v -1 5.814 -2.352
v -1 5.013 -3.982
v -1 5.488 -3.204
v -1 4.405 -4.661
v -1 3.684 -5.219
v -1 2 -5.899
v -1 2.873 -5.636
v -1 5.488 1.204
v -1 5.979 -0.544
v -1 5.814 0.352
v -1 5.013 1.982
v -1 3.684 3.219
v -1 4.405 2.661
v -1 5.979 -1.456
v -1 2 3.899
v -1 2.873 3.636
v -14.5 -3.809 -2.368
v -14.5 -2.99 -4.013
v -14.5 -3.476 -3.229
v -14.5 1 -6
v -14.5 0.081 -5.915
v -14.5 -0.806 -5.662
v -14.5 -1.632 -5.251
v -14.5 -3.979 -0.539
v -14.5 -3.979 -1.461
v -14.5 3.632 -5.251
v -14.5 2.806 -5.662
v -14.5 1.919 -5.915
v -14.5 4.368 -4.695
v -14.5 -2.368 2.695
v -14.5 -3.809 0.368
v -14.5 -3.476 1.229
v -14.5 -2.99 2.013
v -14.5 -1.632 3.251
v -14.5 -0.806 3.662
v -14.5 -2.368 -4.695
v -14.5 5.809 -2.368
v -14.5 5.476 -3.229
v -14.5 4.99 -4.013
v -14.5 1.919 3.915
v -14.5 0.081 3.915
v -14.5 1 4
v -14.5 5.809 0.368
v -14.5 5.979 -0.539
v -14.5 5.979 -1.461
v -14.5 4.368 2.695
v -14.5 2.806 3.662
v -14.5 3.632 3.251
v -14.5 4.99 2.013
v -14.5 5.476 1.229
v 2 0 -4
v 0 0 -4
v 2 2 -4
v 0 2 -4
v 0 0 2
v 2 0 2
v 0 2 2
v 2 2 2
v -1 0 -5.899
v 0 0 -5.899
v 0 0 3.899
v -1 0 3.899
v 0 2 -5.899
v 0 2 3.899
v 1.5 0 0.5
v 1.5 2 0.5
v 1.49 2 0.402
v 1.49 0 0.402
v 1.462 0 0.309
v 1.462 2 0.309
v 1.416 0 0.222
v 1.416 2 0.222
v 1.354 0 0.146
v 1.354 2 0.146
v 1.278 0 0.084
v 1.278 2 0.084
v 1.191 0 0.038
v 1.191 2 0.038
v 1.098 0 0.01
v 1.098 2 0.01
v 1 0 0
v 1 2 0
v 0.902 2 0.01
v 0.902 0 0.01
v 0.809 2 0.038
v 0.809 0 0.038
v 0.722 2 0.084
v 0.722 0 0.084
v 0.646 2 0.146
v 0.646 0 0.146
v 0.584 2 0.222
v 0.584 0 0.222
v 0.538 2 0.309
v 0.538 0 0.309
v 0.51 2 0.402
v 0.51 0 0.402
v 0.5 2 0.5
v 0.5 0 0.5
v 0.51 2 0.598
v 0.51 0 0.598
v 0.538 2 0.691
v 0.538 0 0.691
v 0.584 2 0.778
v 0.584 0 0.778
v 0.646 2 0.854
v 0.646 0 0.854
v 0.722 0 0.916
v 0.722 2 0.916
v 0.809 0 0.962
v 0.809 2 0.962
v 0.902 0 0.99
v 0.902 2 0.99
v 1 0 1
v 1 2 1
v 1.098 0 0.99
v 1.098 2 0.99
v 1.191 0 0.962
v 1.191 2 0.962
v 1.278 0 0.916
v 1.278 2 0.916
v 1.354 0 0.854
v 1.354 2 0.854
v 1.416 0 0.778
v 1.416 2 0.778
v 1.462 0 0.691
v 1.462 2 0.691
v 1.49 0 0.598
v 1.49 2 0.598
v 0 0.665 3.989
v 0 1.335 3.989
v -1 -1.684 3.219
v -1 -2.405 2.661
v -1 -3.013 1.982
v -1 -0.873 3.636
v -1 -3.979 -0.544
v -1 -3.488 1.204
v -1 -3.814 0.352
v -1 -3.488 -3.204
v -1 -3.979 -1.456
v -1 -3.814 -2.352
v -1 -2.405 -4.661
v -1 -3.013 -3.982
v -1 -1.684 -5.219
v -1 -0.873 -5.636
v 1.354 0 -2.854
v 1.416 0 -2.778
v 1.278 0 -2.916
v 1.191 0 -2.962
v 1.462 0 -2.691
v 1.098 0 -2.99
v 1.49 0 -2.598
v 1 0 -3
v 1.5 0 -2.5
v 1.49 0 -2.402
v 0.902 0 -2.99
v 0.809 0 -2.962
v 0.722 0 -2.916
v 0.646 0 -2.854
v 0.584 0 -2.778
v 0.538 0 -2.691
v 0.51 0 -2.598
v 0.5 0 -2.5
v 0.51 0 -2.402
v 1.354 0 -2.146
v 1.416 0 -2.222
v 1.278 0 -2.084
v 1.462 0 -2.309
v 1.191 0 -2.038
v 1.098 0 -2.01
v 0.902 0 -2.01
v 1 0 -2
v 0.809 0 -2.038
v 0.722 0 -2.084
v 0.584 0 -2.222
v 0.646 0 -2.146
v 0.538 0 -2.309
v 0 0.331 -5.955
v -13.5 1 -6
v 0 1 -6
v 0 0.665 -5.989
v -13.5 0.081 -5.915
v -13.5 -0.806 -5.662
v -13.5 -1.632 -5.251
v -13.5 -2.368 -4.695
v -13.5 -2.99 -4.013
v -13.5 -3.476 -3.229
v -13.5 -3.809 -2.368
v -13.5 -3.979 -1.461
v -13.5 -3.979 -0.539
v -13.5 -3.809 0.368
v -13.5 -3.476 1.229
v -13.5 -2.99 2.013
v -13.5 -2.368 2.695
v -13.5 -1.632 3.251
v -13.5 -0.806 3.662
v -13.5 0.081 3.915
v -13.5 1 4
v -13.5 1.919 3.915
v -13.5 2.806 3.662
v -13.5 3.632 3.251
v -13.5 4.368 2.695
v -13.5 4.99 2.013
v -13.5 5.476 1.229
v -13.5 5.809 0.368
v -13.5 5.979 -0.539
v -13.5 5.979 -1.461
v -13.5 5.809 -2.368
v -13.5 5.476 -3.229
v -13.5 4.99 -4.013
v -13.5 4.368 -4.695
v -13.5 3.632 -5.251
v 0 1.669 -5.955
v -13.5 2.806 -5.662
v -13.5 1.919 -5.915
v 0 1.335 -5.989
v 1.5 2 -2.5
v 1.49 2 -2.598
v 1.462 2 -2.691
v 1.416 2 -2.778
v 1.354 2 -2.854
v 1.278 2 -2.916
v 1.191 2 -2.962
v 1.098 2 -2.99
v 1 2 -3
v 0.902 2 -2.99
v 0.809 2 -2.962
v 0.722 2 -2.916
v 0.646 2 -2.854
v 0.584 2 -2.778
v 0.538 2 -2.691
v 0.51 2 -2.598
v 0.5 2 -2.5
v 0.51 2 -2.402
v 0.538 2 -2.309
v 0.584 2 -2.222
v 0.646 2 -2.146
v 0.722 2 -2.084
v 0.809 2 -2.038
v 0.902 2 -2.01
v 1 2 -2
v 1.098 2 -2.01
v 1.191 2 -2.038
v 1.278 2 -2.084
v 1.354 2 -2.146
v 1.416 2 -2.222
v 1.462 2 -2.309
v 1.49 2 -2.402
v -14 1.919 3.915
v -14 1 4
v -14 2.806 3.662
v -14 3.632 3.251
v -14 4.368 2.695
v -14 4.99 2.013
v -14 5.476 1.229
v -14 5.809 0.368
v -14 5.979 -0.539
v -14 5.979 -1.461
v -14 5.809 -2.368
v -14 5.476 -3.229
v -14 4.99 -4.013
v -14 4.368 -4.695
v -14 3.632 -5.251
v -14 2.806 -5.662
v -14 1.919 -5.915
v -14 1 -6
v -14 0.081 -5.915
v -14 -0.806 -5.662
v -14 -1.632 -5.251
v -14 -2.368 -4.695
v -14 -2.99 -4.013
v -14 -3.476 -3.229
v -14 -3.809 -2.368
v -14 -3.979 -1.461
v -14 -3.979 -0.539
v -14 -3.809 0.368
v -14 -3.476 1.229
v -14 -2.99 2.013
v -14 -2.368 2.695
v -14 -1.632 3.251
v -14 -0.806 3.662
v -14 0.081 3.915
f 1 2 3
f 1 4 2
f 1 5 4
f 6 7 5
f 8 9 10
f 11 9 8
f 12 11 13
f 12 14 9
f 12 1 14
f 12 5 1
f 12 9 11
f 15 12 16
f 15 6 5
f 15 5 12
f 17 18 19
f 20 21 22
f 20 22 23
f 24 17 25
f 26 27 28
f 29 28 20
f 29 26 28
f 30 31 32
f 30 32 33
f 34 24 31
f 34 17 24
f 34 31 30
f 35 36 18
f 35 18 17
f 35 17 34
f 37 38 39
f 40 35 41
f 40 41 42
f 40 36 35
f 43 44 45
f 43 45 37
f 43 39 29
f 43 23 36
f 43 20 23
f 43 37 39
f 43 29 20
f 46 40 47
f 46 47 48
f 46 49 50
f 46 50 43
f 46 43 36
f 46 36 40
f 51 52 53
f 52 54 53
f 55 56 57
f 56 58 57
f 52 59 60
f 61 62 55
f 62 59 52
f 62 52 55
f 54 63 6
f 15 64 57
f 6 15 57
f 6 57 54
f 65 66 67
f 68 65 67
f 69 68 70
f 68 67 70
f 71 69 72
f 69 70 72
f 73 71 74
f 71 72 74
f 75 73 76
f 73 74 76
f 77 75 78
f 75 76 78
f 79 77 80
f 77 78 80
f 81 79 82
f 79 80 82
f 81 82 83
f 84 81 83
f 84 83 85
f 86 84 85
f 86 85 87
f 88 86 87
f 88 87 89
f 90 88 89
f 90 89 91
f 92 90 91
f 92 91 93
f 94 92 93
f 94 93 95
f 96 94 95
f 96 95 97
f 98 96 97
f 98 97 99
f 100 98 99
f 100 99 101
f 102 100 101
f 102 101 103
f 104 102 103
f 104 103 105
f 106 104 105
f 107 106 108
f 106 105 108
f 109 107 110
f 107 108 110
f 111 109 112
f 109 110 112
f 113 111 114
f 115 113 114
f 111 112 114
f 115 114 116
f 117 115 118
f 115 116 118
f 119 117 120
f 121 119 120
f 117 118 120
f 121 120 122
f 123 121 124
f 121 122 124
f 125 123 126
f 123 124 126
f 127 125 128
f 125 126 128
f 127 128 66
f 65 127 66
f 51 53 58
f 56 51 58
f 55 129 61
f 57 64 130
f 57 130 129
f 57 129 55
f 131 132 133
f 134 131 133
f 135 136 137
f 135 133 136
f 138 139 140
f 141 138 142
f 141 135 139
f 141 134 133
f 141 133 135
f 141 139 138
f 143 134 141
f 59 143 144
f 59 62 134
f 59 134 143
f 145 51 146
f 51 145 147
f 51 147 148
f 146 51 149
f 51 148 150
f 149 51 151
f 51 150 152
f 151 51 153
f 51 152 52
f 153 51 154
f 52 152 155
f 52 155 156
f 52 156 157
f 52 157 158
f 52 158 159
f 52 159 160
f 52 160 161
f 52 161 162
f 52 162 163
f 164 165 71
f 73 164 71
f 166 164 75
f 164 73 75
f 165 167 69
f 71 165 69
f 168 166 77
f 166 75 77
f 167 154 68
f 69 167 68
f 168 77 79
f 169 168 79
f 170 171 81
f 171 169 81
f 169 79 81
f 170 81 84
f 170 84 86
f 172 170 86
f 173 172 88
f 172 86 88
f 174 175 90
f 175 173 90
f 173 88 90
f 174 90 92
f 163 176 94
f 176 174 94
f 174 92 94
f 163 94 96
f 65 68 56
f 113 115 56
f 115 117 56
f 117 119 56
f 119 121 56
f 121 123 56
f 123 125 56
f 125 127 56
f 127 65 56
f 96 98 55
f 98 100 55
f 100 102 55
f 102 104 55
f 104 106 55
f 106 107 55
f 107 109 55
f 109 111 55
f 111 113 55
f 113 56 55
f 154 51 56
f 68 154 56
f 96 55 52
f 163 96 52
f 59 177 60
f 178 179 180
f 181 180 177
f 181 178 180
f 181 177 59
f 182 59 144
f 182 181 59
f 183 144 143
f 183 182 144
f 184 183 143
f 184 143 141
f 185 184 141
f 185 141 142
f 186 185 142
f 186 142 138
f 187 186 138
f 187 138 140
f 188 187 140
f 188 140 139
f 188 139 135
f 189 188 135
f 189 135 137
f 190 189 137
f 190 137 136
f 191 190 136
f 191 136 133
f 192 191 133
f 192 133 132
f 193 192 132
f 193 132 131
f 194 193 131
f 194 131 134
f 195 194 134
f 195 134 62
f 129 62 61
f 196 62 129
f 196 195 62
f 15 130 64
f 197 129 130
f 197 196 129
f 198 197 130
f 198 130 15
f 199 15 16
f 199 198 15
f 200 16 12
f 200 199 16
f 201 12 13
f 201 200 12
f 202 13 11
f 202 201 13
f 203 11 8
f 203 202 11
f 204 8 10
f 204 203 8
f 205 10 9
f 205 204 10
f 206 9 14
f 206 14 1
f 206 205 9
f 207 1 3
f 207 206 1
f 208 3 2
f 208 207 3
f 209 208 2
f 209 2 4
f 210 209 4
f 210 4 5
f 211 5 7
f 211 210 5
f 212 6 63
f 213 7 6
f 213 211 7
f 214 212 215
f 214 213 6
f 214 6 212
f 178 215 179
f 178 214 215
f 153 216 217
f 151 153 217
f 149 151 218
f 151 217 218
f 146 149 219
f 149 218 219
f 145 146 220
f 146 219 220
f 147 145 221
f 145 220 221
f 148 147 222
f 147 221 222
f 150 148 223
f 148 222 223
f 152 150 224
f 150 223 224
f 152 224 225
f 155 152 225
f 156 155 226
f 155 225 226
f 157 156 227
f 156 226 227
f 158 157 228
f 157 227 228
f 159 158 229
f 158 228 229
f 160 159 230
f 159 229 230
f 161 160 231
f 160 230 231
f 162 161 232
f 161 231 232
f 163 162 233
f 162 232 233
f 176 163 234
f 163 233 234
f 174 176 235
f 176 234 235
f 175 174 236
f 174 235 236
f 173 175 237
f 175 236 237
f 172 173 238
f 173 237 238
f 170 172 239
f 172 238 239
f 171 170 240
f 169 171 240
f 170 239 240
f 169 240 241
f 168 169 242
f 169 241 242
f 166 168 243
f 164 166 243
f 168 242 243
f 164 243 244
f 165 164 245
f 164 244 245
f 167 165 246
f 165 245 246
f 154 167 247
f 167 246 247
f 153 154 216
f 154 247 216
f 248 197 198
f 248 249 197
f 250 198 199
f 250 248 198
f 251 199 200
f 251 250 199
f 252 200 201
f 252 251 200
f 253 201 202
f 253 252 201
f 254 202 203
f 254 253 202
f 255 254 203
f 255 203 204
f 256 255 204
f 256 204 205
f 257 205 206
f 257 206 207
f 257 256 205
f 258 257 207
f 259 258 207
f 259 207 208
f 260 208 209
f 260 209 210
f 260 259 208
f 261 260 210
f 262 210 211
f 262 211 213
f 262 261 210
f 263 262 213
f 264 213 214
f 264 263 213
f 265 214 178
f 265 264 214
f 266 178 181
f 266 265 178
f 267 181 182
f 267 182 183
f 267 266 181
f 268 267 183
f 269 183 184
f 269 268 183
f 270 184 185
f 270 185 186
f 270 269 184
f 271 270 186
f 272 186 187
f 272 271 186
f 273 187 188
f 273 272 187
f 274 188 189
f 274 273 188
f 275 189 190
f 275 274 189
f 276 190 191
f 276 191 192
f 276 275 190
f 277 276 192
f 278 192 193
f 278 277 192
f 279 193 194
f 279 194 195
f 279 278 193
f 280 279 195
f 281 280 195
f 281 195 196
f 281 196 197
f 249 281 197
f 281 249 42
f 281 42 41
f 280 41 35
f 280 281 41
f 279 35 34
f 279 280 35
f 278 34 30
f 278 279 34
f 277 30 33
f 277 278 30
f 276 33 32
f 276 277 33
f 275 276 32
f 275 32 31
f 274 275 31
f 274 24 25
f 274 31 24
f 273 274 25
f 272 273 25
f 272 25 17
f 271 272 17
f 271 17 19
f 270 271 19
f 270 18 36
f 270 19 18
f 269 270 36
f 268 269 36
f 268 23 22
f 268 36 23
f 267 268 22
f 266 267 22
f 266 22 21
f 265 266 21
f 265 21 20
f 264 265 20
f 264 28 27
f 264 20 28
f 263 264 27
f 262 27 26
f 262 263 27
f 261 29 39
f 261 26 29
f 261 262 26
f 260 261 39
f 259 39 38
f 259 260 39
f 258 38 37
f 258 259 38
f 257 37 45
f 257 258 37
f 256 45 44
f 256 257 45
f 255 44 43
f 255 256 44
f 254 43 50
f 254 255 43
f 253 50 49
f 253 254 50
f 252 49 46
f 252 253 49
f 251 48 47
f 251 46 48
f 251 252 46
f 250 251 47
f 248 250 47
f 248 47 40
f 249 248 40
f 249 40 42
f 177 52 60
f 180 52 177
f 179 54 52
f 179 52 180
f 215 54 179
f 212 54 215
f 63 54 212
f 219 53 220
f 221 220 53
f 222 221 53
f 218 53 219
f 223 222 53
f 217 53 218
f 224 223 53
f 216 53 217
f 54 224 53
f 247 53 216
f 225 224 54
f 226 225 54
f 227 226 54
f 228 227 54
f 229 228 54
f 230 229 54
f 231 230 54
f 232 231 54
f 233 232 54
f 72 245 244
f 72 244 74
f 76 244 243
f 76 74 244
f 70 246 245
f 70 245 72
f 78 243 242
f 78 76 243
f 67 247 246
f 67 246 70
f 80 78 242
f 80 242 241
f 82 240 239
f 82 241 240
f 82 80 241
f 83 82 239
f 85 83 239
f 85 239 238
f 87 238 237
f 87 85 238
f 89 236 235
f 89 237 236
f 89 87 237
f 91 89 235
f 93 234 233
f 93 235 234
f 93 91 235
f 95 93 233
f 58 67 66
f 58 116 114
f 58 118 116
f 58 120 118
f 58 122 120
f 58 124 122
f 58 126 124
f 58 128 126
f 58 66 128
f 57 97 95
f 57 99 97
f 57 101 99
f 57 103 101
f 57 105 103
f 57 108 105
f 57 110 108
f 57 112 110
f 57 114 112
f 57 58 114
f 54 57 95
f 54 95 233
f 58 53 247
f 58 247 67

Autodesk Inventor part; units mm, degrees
ref_plane "YZ Plane" through (0, 0, 0) normal (1, 0, 0) x (0, 1, 0)
ref_plane "XZ Plane" through (0, 0, 0) normal (0, 1, 0) x (-1, 0, 0)
sketch "Sketch1" plane through (0, 0, 0) normal (0, 1, 0) x (-1, 0, 0)
  line L0 (0, 0) -> (20, 0)
  line L1 (20, 0) -> (20, -2)
  line L2 (20, -2) -> (0, -2)
  line L3 (0, -2) -> (0, 0)
  dimension "d0" = 20
  dimension "d1" = 2
extrude "Extrusion1" add sketch "Sketch1" along normal blind 2
sketch "Sketch2" plane through (0, 2, 0) normal (0, 1, 0) x (1, 0, 0)
  line L0 (0, 2) -> (-20, 2) projected
  line L1 (0, 2) -> (0, 4)
  line L2 (0, 4) -> (2, 4)
  line L3 (2, 4) -> (2, -2)
  line L4 (2, -2) -> (0, -2)
  line L5 (0, 0) -> (0, 2) projected
  line L6 (0, -2) -> (0, 0)
  dimension "d4" = 2
  dimension "d5" = 2
  dimension "d6" = 6
extrude "Extrusion2" add sketch "Sketch2" against normal blind 2
sketch "Sketch3" plane through (0, 2, 0) normal (0, 1, 0) x (1, 0, 0)
  line L0 (0, 0) -> (0, -2) projected
  line L1 (0, -2) -> (0, -1)
  line L2 (2, 4) -> (2, -2) projected
  line L3 (2, -2) -> (2, -0.5)
  line L4 (2, -0.5) -> (1, -0.5)
  circle A0 centre (1, -0.5) radius 0.5
  line L5 (2, 1) -> (1.5, 1)
  circle A1 centre (1, 2.5) radius 0.5
  dimension "d9" = 1.5
  dimension "d10" = 1
  dimension "d11" = 1
extrude "Extrusion3" cut sketch "Sketch3" against normal blind 2
sketch "Sketch4" plane through (0, 2, -4) normal (-1, 0, 0) x (0, 0, 1)
  line L0 (2, 0) -> (4, 0) projected
  line L1 (3, 0) -> (3, -2)
  line L2 (2, -2) -> (4, -2) projected
  circle A0 centre (3, -1) radius 1
  line L3 (2, -2) -> (2, 0) projected
  circle A1 centre (3, -1) radius 1.4142
extrude "Extrusion4" cut sketch "Sketch4" along normal blind 100 contours L0 A0 L3 | L3 A1 | L0 A1 L2 A0 | A0 L2 L3
ref_plane "Work Plane1" through (-14, 1, -1) normal (-1, 0, 0) x (0, 0, 1)
sketch "Sketch5" plane through (-14, 1, -1) normal (-1, 0, 0) x (0, 0, 1)
  circle A0 centre (0, 0) radius 5
  point P0 (1, -1)
  dimension "d17" = 10
extrude "Extrusion5" add sketch "Sketch5" along normal mid plane 1
sketch "Sketch6" plane through (-20, 1, -1) normal (-1, 0, 0) x (0, 0, 1)
  circle A0 centre (0, 0) radius 5
  point P0 (1, -1)
extrude "Extrusion6" cut sketch "Sketch6" against normal blind 5.5
sketch "Sketch7" plane through (-13.5, 1, -1) normal (1, 0, 0) x (0, 0, -1)
  circle A0 centre (0, 0) radius 5 projected
  circle A1 centre (0, 0) radius 5
  point P0 (-1, -1)
extrude "Extrusion7" add sketch "Sketch7" along normal blind 13.5
sketch "Sketch8" plane through (0, 0, 0) normal (0, -1, 0) x (1, 0, 0)
  line L0 (2, -4) -> (-1, -4)
  line L1 (-1, -4) -> (-1, -6.7389)
  line L2 (-1, -6.7389) -> (2, -6.7389)
  line L3 (2, -6.7389) -> (2, -4)
  line L4 (2, -4) -> (2, 2) projected
  line L5 (2, 2) -> (-1, 2)
  line L6 (-1, 2) -> (-1, 5.2785)
  line L7 (-1, 5.2785) -> (2, 5.2785)
  line L8 (2, 5.2785) -> (2, 2)
  line L9 (2, 5.2785) -> (-1, 5.2785)
  line L10 (-1, 5.2785) -> (-1, -6.7389)
  line L11 (-1, -6.7389) -> (2, -6.7389)
  line L12 (2, -6.7389) -> (2, 5.2785)
  point P0 (0, 0)
  dimension "d24" = 3
  dimension "d25" = 3
extrude "Extrusion8" cut sketch "Sketch8" along normal blind 13.5
ref_plane "Work Plane2" through (0, 1, 0) normal (0, -1, 0) x (1, 0, 0)
mirror "Mirror1" about plane through (0, 1, 0) normal (0, -1, 0) of "Extrusion8"
properties part number "drive_shaft_v3"
